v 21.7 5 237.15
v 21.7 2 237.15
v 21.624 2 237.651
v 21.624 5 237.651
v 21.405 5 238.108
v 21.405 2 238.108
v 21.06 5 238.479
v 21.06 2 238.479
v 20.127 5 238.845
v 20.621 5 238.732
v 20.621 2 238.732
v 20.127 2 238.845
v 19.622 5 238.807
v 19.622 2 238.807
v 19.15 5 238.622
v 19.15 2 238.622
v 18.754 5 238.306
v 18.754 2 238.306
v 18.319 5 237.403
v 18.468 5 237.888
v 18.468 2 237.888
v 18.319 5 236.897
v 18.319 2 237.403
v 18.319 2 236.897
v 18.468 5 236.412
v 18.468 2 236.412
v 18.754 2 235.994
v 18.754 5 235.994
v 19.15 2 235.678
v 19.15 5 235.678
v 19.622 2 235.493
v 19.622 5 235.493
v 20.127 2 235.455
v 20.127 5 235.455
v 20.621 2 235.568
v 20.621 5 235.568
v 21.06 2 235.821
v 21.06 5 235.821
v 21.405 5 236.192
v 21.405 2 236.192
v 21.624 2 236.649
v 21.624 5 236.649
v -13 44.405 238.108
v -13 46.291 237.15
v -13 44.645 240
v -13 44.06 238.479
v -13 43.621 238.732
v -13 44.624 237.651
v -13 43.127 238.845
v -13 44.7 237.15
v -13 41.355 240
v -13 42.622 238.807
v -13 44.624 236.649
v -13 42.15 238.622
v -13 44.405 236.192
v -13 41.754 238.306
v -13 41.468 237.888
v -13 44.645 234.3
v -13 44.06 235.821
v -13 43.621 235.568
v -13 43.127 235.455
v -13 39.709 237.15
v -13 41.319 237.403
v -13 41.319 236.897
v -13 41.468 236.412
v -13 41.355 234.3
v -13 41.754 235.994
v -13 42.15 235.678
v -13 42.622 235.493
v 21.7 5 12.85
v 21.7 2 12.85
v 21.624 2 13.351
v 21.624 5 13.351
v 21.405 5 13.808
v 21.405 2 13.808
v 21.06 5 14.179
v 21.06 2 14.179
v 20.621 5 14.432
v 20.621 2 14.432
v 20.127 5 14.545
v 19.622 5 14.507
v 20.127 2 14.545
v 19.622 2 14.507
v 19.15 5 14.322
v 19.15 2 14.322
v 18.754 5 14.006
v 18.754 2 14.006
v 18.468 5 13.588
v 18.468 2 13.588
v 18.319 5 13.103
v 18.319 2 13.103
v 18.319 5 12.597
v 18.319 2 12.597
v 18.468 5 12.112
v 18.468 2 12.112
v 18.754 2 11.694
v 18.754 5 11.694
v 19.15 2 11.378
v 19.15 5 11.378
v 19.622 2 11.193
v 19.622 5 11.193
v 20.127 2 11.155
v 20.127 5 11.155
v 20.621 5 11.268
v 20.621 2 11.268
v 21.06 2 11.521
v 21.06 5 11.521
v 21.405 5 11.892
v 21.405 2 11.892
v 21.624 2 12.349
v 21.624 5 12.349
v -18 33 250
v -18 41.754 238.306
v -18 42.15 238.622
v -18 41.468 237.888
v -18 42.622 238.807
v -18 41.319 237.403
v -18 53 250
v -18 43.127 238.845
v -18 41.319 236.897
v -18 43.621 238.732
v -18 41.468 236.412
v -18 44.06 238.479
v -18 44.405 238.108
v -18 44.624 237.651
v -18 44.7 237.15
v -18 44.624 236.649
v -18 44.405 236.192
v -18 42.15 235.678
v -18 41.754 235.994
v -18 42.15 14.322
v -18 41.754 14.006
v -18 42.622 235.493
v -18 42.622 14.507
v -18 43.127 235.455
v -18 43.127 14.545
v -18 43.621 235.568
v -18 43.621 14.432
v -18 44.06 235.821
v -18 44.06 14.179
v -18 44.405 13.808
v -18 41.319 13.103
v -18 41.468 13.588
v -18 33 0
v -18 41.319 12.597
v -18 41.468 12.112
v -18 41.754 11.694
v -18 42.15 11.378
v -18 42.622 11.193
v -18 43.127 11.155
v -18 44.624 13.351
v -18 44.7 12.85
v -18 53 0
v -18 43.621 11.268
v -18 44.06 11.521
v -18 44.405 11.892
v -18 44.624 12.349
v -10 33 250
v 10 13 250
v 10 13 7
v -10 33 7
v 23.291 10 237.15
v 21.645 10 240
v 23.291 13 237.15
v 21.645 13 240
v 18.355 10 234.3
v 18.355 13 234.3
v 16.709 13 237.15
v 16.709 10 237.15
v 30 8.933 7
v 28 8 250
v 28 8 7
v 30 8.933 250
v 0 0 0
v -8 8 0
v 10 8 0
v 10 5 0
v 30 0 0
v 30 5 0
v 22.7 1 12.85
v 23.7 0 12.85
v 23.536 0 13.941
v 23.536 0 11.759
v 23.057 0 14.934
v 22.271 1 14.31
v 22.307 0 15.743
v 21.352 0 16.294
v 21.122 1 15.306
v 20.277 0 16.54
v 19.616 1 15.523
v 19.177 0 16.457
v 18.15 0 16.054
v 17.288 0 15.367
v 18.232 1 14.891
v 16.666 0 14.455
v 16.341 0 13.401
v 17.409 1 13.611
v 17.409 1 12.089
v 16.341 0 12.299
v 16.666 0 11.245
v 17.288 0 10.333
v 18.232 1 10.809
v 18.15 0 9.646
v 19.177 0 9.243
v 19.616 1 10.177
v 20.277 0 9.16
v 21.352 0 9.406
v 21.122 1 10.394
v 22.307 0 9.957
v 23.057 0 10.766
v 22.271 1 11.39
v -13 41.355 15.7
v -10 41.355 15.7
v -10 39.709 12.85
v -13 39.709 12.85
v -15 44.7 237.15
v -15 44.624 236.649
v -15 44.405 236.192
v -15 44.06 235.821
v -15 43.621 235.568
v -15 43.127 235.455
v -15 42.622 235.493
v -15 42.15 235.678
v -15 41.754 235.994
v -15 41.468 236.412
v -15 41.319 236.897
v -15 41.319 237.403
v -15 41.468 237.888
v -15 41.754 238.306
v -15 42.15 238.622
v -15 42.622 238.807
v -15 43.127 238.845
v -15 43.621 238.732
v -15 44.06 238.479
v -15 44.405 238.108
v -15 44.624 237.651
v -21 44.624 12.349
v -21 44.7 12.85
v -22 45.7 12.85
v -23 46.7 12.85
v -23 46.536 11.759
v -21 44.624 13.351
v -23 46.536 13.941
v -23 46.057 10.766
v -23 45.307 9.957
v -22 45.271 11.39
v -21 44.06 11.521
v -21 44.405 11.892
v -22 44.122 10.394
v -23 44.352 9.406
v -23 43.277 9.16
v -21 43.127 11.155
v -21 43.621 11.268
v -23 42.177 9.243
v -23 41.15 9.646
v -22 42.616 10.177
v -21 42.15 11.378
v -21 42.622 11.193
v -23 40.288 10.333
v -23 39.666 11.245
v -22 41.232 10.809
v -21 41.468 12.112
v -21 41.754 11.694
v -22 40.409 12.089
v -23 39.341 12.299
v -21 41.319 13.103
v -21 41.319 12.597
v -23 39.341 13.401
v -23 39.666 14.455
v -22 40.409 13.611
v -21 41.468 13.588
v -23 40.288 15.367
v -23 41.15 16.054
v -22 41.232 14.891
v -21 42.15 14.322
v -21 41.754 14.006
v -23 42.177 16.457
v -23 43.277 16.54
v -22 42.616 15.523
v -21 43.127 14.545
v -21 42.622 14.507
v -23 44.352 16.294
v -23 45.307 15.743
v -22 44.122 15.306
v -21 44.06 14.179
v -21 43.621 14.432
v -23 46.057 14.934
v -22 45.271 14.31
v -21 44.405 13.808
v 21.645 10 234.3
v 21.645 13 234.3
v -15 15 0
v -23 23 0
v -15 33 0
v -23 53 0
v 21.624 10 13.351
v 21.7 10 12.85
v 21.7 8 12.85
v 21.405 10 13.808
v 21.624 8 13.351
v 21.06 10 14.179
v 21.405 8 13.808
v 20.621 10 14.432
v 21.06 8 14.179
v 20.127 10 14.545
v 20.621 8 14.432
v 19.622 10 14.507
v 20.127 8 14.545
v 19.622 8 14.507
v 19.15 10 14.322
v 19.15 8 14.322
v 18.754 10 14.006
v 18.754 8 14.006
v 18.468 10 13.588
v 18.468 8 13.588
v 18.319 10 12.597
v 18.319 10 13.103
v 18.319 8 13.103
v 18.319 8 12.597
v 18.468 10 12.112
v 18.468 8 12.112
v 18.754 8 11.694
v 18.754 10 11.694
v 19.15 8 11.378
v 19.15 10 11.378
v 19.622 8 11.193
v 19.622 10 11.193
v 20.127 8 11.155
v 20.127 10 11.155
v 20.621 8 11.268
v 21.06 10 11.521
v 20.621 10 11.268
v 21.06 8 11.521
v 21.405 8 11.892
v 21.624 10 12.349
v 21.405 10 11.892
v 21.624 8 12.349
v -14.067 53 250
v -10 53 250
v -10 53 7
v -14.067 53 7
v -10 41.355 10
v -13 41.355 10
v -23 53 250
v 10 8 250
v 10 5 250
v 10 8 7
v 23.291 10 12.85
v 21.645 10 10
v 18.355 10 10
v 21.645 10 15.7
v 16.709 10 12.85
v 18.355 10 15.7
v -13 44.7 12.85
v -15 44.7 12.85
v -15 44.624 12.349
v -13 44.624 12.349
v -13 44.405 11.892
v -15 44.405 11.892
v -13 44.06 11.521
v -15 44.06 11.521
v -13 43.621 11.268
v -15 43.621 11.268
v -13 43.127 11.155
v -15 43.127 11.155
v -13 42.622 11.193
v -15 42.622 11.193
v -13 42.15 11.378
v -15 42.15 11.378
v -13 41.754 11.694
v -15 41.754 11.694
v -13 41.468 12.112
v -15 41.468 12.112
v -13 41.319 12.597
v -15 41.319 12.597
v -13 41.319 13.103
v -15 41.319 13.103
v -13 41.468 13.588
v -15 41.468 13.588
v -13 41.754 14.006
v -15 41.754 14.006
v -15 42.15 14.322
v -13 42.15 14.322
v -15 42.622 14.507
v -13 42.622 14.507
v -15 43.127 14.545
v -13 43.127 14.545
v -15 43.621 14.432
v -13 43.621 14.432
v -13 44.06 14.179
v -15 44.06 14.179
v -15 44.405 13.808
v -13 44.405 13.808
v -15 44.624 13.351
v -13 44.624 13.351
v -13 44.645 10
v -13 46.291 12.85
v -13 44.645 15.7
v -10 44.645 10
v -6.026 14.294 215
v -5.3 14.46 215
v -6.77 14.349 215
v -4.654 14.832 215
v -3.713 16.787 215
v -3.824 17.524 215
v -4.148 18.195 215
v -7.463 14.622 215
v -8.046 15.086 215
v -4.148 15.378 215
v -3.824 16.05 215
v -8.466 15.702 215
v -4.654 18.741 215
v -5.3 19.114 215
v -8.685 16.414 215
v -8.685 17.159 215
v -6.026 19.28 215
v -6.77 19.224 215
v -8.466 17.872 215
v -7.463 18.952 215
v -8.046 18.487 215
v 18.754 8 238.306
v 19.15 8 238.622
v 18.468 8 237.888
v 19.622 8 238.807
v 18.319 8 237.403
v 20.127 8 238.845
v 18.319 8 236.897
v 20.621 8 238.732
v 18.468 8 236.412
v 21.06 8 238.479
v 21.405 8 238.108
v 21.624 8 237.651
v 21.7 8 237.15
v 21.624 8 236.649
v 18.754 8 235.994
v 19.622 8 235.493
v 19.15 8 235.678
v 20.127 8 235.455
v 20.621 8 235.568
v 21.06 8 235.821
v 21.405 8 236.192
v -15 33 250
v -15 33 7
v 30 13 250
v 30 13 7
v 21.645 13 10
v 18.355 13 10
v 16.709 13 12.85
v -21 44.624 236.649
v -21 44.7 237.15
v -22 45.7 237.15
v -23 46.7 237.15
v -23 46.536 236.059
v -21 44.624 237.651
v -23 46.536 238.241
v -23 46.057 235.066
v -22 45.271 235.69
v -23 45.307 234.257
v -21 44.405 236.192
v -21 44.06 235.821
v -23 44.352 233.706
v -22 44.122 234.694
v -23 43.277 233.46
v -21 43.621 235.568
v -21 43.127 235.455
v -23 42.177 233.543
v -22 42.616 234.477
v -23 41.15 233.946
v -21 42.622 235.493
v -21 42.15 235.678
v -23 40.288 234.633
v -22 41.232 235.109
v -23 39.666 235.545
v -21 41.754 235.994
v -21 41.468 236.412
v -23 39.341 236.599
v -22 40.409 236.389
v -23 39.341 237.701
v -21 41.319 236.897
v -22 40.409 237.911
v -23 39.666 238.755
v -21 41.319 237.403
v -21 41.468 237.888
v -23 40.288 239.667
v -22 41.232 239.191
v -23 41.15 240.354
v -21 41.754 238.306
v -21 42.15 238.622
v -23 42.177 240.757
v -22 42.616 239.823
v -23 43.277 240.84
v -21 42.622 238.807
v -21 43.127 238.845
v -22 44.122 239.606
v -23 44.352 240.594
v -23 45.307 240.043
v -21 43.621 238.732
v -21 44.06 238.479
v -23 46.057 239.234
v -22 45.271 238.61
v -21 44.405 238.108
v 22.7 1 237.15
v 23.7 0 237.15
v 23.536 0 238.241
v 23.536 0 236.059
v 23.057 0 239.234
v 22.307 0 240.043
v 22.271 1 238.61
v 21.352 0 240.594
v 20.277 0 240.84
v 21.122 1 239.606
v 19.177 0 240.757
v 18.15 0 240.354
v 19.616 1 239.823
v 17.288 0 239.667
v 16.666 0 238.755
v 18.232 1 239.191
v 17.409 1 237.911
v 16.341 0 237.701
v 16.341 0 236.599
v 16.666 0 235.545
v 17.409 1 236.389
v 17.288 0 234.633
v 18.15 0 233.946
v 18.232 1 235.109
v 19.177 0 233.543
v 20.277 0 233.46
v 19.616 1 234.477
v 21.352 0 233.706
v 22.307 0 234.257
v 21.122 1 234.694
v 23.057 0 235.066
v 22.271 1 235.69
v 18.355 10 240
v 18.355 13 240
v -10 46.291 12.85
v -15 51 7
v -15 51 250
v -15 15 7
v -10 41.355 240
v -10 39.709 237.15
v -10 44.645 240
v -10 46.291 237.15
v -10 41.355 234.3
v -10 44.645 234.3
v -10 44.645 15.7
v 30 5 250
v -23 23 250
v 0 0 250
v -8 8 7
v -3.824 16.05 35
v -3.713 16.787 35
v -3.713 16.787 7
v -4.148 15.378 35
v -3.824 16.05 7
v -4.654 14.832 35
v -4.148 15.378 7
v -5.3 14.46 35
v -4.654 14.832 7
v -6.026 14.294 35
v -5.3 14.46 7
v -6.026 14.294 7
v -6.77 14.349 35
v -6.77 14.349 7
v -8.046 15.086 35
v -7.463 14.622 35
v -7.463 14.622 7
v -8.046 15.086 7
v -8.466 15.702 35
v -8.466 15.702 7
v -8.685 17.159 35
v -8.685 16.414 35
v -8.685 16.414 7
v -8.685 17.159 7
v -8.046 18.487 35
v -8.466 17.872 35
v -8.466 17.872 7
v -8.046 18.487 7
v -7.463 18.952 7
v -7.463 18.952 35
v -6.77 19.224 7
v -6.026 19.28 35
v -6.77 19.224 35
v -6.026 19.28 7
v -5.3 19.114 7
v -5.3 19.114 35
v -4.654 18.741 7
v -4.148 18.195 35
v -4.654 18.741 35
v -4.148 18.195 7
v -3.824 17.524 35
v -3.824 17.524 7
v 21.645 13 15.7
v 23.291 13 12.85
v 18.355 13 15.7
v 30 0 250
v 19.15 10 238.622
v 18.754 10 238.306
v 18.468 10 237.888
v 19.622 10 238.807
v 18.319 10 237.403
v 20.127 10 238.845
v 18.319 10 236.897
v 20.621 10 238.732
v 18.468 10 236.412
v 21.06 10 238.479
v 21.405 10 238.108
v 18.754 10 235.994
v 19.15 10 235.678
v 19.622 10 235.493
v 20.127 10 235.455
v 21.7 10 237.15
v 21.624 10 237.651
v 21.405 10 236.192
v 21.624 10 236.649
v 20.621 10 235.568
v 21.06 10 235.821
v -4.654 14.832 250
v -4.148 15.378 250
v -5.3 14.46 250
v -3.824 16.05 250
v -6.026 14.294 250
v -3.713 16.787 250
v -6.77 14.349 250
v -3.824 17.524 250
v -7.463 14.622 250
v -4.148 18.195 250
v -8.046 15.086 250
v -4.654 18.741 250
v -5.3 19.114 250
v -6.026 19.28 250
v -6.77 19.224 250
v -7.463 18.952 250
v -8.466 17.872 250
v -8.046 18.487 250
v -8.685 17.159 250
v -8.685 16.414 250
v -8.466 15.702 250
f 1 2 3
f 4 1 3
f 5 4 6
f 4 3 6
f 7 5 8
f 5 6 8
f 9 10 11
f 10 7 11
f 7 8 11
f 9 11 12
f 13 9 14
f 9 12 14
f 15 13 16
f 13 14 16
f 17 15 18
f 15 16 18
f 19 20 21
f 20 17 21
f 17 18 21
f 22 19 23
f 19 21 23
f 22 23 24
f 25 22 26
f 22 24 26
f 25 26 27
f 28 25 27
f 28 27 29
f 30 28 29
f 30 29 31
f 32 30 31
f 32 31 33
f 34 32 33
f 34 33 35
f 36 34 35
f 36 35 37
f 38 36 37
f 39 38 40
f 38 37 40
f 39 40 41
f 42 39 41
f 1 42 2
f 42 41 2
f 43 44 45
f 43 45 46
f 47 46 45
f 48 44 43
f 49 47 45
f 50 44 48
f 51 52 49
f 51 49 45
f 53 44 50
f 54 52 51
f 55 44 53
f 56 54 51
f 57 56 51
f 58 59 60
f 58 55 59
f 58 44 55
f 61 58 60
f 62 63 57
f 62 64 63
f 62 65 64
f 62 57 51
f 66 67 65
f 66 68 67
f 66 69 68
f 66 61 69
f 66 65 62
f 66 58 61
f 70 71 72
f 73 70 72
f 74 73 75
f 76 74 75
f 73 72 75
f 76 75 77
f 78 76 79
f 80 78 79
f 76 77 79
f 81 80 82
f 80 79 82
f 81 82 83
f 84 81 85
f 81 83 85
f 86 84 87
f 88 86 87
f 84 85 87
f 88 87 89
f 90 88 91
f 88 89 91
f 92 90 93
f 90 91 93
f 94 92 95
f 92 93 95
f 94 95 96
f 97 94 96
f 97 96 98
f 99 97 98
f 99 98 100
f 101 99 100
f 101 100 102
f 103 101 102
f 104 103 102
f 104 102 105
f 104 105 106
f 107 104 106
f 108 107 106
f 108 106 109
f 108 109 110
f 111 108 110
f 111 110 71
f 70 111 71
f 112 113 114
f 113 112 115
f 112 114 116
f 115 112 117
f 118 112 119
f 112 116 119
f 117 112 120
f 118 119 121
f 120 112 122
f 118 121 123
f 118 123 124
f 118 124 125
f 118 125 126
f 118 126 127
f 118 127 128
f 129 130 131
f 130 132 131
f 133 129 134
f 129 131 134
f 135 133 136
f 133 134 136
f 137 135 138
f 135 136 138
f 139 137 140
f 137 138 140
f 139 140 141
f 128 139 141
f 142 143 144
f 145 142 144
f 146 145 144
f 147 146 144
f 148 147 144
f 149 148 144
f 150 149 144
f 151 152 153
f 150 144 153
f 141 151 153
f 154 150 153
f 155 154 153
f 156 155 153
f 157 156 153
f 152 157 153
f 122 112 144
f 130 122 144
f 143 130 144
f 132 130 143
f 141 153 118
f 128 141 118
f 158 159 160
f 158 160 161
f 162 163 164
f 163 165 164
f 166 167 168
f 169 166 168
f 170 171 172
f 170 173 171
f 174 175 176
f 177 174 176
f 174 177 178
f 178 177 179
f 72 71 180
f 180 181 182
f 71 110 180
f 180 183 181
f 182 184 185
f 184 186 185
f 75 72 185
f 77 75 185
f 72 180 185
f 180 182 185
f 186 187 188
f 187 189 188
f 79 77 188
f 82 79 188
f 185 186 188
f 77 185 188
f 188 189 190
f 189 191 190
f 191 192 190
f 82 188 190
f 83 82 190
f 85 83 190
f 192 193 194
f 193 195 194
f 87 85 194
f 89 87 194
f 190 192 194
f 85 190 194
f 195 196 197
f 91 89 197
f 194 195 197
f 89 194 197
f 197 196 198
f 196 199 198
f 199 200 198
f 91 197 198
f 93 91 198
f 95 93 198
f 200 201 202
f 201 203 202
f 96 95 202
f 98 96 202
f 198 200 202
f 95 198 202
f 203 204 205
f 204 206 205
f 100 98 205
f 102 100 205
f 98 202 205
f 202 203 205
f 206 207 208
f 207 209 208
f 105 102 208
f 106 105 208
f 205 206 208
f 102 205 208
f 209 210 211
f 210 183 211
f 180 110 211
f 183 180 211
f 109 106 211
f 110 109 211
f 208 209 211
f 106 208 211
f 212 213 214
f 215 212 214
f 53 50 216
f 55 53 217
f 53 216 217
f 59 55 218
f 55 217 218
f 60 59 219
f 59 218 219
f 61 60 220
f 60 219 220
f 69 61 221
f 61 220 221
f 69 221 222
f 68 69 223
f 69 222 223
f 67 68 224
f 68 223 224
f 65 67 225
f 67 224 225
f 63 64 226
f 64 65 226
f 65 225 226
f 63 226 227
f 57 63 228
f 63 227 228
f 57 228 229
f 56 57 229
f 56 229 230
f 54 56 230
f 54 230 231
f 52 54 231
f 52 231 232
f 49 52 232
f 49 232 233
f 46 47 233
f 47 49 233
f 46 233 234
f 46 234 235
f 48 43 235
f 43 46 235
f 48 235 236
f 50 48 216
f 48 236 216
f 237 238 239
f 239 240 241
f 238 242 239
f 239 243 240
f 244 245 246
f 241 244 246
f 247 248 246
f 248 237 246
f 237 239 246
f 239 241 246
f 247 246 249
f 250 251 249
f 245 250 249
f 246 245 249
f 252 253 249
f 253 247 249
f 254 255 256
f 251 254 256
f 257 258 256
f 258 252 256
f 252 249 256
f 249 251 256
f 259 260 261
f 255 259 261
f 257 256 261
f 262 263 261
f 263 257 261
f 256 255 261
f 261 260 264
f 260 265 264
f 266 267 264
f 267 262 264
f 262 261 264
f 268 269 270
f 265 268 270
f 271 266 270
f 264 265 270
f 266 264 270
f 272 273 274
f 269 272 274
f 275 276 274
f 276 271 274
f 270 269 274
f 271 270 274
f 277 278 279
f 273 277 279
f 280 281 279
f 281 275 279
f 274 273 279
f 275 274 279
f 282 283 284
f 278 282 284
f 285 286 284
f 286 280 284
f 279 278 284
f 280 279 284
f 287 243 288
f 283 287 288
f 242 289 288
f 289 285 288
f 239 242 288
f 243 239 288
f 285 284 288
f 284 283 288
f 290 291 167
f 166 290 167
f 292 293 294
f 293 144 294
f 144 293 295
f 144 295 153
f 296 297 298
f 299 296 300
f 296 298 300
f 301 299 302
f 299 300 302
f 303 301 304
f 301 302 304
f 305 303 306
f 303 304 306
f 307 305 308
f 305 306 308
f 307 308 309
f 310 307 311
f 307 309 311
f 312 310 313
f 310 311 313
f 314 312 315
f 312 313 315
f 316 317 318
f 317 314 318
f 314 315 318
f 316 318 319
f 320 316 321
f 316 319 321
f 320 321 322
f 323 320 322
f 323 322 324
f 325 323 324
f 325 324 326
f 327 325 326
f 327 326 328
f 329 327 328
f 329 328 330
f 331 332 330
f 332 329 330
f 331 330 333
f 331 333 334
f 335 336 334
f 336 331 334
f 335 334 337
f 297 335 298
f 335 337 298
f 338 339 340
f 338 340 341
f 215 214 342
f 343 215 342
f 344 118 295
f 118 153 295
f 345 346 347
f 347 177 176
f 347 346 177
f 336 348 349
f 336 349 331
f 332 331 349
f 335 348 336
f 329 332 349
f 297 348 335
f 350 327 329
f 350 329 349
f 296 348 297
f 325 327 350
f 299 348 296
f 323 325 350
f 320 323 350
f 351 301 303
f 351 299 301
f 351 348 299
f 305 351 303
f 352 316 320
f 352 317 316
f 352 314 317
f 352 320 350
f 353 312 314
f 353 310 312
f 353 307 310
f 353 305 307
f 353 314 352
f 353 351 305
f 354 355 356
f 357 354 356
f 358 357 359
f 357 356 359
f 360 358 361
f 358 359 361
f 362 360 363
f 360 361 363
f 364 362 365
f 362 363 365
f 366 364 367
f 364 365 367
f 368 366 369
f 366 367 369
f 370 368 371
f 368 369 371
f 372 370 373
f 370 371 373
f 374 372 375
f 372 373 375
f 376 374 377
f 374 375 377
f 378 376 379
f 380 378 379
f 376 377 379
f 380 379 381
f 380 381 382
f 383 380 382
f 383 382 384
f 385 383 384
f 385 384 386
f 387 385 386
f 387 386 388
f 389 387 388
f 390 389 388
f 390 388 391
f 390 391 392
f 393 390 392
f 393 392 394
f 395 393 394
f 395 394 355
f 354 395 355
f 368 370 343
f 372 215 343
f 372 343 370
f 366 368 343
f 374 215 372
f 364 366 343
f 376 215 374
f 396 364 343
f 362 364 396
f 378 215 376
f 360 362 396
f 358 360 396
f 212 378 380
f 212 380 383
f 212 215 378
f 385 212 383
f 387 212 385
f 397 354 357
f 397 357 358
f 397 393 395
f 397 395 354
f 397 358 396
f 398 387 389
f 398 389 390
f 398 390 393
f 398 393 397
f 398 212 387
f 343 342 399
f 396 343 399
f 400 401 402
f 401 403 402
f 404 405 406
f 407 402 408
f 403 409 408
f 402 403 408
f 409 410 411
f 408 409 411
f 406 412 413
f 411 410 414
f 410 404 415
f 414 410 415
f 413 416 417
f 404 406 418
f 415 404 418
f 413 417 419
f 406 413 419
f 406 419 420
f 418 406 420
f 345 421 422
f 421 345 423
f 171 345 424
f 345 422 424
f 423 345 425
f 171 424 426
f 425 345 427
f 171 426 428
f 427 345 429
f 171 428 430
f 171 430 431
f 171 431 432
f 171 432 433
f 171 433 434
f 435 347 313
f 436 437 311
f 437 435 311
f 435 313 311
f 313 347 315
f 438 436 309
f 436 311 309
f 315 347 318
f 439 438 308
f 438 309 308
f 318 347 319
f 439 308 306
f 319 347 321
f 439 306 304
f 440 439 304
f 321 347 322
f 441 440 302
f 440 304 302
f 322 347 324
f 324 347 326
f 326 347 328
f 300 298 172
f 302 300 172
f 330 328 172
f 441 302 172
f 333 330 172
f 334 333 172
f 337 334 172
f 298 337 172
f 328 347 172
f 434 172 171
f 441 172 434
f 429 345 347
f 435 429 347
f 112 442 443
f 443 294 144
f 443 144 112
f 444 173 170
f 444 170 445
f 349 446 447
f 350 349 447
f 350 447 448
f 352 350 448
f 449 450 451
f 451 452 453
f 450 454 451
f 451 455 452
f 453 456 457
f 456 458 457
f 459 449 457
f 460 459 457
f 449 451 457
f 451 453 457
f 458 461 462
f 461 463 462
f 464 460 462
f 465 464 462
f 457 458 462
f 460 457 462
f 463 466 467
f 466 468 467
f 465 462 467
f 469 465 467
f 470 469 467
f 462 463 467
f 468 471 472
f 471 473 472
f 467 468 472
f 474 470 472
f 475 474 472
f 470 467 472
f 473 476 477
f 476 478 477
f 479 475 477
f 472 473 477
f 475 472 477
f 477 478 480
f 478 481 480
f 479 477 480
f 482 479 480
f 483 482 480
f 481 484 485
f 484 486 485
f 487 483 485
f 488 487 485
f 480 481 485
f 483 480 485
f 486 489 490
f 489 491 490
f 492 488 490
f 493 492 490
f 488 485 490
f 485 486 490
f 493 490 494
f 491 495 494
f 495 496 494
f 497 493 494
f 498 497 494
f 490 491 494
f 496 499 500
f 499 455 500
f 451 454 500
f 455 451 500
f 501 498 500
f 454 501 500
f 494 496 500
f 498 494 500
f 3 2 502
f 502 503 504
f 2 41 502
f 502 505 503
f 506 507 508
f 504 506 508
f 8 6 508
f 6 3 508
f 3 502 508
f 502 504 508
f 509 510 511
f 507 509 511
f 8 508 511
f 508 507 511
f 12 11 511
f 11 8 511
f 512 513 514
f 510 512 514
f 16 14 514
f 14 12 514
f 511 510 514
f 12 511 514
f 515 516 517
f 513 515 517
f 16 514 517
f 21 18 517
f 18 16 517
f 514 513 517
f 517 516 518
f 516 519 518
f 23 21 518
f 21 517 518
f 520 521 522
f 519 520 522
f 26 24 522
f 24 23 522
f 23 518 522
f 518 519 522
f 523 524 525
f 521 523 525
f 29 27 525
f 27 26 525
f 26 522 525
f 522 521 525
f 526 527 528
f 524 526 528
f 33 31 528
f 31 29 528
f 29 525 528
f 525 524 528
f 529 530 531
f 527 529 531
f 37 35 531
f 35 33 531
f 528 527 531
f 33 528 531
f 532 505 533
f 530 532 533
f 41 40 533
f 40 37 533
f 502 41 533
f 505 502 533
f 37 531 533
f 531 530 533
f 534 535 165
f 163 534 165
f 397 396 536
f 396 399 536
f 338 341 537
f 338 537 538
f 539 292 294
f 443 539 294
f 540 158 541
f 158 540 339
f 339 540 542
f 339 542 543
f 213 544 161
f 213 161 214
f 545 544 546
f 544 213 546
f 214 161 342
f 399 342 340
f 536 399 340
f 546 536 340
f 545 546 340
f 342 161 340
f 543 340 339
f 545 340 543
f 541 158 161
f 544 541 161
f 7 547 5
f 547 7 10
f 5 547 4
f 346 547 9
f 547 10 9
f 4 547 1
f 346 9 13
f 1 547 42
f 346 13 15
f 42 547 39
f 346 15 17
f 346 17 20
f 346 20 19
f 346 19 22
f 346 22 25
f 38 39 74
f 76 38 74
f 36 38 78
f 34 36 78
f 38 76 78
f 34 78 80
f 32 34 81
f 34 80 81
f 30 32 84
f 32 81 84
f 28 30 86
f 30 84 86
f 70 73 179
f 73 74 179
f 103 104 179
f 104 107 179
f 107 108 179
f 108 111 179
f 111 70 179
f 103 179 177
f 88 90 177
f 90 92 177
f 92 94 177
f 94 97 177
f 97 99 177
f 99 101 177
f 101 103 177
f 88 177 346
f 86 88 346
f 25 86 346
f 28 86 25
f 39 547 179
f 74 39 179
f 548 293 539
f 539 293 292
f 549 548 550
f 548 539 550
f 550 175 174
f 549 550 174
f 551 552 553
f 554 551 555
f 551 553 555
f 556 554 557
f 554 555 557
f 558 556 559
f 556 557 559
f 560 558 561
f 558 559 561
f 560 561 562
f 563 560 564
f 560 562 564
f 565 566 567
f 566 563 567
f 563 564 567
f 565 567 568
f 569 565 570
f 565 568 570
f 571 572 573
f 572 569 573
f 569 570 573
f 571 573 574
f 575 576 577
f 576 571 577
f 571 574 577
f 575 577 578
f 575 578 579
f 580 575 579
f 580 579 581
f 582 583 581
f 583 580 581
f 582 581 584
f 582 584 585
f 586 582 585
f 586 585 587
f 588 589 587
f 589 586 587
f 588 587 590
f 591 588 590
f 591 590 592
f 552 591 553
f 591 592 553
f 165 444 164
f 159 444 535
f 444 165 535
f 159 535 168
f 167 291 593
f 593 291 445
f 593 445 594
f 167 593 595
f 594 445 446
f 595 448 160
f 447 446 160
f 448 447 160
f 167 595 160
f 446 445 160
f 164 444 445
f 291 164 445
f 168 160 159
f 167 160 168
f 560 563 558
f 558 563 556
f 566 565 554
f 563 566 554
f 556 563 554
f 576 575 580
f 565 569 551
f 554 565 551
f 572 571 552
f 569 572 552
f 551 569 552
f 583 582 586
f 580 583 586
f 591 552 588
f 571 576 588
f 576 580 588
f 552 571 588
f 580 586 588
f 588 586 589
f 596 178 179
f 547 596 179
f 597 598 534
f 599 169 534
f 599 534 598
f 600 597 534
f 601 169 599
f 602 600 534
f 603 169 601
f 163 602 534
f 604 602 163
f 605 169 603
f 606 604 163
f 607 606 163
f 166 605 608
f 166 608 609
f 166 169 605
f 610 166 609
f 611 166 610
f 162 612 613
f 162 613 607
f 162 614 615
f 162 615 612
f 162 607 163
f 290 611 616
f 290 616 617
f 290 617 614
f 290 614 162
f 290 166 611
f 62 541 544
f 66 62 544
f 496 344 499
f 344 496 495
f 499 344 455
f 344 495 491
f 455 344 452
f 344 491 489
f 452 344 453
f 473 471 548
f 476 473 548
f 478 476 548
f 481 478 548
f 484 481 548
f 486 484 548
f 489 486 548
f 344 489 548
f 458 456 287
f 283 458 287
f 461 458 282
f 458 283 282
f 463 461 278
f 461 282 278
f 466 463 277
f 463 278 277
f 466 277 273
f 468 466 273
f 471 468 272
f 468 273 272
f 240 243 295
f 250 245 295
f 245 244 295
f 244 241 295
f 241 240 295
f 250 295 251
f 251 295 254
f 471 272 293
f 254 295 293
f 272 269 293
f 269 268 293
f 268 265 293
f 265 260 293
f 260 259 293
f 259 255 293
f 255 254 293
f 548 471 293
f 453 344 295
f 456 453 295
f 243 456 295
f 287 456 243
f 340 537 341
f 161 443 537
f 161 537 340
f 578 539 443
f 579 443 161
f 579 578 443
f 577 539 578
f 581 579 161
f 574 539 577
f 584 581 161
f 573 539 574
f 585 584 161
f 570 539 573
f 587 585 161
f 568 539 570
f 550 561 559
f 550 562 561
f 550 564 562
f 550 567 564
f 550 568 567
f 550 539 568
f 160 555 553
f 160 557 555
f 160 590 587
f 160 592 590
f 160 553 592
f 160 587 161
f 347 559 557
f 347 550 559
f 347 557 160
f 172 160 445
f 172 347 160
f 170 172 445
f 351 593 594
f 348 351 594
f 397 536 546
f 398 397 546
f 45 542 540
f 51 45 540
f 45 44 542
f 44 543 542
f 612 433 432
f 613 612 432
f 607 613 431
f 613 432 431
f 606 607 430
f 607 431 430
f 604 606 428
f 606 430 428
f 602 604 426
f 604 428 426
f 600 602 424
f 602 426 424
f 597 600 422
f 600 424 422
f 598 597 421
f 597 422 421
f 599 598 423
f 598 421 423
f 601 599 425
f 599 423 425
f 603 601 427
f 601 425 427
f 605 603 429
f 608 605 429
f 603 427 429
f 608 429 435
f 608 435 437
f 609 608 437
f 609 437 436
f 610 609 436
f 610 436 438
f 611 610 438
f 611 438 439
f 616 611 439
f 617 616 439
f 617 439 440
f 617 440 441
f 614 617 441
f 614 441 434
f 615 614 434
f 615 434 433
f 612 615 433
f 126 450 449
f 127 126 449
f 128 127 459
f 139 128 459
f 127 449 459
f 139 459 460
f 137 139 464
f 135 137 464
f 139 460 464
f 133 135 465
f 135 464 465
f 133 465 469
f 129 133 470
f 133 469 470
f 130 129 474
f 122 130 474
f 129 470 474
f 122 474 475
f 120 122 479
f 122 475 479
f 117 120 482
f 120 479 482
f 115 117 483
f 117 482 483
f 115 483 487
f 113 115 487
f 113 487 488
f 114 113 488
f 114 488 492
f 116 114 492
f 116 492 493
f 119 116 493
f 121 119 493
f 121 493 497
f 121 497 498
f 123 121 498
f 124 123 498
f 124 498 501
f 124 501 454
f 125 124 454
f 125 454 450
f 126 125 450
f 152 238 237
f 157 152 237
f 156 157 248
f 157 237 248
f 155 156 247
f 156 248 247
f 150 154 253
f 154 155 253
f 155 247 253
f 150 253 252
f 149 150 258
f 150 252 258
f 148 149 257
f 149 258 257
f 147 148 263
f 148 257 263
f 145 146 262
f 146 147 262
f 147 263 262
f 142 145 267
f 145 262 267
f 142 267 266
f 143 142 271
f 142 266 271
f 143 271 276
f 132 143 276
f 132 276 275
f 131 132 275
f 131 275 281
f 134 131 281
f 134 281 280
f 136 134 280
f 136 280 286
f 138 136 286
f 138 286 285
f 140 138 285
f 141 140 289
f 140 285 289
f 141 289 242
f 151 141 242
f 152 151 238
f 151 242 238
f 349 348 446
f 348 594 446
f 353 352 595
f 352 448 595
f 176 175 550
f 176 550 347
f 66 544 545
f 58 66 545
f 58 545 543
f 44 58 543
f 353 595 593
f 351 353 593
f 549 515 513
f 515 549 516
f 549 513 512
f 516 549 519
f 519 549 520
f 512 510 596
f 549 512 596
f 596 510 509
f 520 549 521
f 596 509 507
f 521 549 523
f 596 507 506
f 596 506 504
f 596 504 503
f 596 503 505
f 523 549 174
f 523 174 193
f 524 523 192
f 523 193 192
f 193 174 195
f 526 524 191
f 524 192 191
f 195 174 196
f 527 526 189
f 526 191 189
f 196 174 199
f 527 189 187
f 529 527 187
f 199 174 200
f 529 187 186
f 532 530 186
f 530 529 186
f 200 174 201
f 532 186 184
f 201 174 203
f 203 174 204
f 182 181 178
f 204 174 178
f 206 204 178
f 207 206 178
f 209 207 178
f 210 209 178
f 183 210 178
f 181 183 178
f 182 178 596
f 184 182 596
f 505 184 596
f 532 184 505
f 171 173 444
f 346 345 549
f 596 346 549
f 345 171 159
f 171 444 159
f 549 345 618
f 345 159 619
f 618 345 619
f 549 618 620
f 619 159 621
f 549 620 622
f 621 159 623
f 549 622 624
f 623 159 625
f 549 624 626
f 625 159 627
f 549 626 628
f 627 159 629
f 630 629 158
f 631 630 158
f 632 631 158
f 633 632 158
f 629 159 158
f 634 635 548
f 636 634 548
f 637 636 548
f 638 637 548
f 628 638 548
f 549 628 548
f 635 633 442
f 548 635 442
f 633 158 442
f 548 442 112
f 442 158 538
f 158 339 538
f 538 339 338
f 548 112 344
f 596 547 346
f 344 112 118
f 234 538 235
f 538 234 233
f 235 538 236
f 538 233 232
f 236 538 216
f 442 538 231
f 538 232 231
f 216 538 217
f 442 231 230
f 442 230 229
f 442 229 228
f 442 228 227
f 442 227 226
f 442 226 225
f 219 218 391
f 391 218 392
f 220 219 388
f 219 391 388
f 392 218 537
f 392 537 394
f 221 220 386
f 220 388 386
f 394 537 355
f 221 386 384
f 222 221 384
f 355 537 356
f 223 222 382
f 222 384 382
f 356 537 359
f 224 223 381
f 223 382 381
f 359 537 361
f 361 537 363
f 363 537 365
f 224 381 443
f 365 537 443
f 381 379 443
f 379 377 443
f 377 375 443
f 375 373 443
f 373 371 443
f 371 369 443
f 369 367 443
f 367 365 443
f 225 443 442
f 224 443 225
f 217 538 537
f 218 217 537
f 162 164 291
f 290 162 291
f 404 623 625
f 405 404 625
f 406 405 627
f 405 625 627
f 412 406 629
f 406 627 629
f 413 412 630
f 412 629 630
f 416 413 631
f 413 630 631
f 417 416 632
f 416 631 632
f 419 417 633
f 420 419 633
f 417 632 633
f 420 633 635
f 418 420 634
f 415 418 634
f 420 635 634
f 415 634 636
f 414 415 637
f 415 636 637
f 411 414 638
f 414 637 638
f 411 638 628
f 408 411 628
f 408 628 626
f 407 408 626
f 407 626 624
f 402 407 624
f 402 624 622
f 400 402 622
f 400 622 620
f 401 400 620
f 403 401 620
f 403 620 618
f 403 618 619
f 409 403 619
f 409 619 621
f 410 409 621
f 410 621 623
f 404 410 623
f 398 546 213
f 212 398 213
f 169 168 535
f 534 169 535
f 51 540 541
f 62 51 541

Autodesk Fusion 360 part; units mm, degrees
sketch "Esquisse1" plane through (0, 0, 0) normal (0, 0, 1) x (1, 0, 0)
  line L0 (0, 0) -> (30, 0)
  line L1 (30, 0) -> (30, 5)
  line L2 (30, 5) -> (10, 5)
  line L3 (10, 5) -> (10, 8)
  line L4 (10, 8) -> (30, 8)
  line L5 (30, 8) -> (30, 13)
  line L6 (30, 13) -> (10, 13)
  line L7 (10, 13) -> (0, 23)
  line L8 (0, 23) -> (-11.5, 11.5)
  line L9 (-11.5, 11.5) -> (0, 0)
  dimension "d2" = 3
  dimension "d3" = 5
  dimension "d4" = 20
  dimension "d5" = 30
  dimension "d6" = 20
  dimension "d7" = 15
  dimension "d8" = 135
  dimension "d22" = 13
extrude "Extrusion1" add sketch "Esquisse1" along normal blind 125 makes body 1
chamfer "Chanfrein2" distance 2 angle 25 1 edges at (30, 8, 62.5) measured on face at (16.6667, 8, 41.6667) on bodies 1
sketch "Esquisse2" plane through (0, 0, 0) normal (0, -1, 0) x (1, 0, 0)
  line L0 (0, 0) -> (30, 0)
  line L1 (30, 0) -> (30, 125)
  line L2 (30, 125) -> (0, 125)
  line L3 (0, 125) -> (0, 0)
  circle A0 centre (20, 12.85) radius 1.7
  line L4 (18.3546, 15.7) -> (16.7091, 12.85)
  line L5 (16.7091, 12.85) -> (18.3546, 10)
  line L6 (18.3546, 10) -> (21.6454, 10)
  line L7 (21.6454, 10) -> (23.2909, 12.85)
  line L8 (23.2909, 12.85) -> (21.6454, 15.7)
  line L9 (21.6454, 15.7) -> (18.3546, 15.7)
  line L10 (0, 0) -> (30, 0)
  point P0 (20, 12.85)
  point P1 (-10, 0)
  point P2 (-30, 125)
  dimension "d11" = 3.4
  dimension "d12" = 2.85
  dimension "d15" = 10
  dimension "d16" = 10
extrude "Extrusion2" cut sketch "Esquisse2" against normal blind 13 contours A0 bodies 1
chamfer "Chanfrein1" distance 2 angle 45 1 edges at (18.415, 0, 13.4647) on bodies 1
sketch "Esquisse3" plane through (0, 13, 0) normal (0, 1, 0) x (-1, 0, 0)
  circle A0 centre (-20, 12.85) radius 1.7
  line L0 (-30, 0) -> (-10, 0)
  line L1 (-10, 0) -> (-10, 125)
  line L2 (-10, 125) -> (-30, 125)
  line L3 (-30, 125) -> (-30, 0)
  line L4 (-18.3546, 15.7) -> (-21.6454, 15.7)
  line L5 (-21.6454, 15.7) -> (-23.2909, 12.85)
  line L6 (-23.2909, 12.85) -> (-21.6454, 10)
  line L7 (-21.6454, 10) -> (-18.3546, 10)
  line L8 (-18.3546, 10) -> (-16.7091, 12.85)
  line L9 (-16.7091, 12.85) -> (-18.3546, 15.7)
  point P0 (-20, 12.85)
  dimension "d23" = 2.85
extrude "Extrusion4" cut sketch "Esquisse3" against normal blind 3 contours L4 L5 L6 L7 L8 L9 bodies 1
ref_plane "Plan de construction2" through (-5.75, 17.25, 62.5) normal (-0.7071, 0.7071, 0) x (-0.7071, -0.7071, 0)
mirror "Symétrie miroir1" about plane through (-5.75, 17.25, 62.5) normal (-0.7071, 0.7071, 0) of bodies 1 merged
sketch "Esquisse4" plane through (0, 0, 0) normal (0, 0, 1) x (1, 0, 0)
  line L0 (10, 13) -> (-10, 33) construction
  line L1 (-6.2132, 8) -> (-6.2132, 16.7868) construction
  line L2 (-6.2132, 16.7868) -> (-15, 16.7868) construction
  line L3 (-6.2132, 16.7868) -> (0, 23) construction
  line L4 (29.8, 8) -> (8.2, 8) construction
  line L5 (-15, 52.8) -> (-15, 31.2) construction
  circle A0 centre (-6.2132, 16.7868) radius 2.5
  point P0 (-15, 8)
  dimension "d32" = 5
  dimension "d33" = 8.7868
extrude "Extrusion5" cut sketch "Esquisse4" along normal blind 35 bodies 1
ref_plane "Plan de construction3" through (3.5, 26.5, 125) normal (0, 0, 1) x (1, 0, 0)
mirror "Symétrie miroir2" about plane through (3.5, 26.5, 125) normal (0, 0, 1) of bodies 1 merged
sketch "Esquisse5" plane through (0, 0, 0) normal (0, 0, -1) x (1, 0, 0)
  line L0 (30, -8.9326) -> (28, -8)
  line L1 (28, -8) -> (10, -8)
  line L2 (10, -8) -> (10, -5)
  line L3 (10, -5) -> (30, -5)
  line L4 (30, -5) -> (30, 0)
  line L5 (30, 0) -> (0, 0)
  line L6 (0, 0) -> (-23, -23)
  line L7 (-23, -23) -> (-23, -53)
  line L8 (-23, -53) -> (-18, -53)
  line L9 (-18, -53) -> (-18, -33)
  line L10 (-18, -33) -> (-15, -33)
  line L11 (-15, -33) -> (-15, -51)
  line L12 (-15, -51) -> (-14.0674, -53)
  line L13 (-14.0674, -53) -> (-10, -53)
  line L14 (-10, -53) -> (-10, -33)
  line L15 (-10, -33) -> (10, -13)
  line L16 (10, -13) -> (30, -13)
  line L17 (30, -13) -> (30, -8.9326)
  line L18 (-15, -8) -> (185, -8)
  line L19 (185, -8) -> (185, -208)
  line L20 (185, -208) -> (-15, -208)
  line L21 (-15, -208) -> (-15, -8)
  circle A0 centre (-6.2132, -16.7868) radius 2.5
  dimension "d39" = 200
  dimension "d40" = 200
extrude "Extrusion6" cut sketch "Esquisse5" against normal blind 7 contours L0 L1 L6 L11 L12 L13 L14 L15 L16 L17 L18 L21 | L0 L12 L13 L14 L15 L16 L17 L18 L19 L20 L21 | A0 bodies 1
copy_body "Corps->Comp1" bodies 1 removing the originals makes body 2 in component "Component"
component "Component" placed x (1, 0, 0) y (0, 1, 0) z (0, 0, 1) at (0, 0, 0)
equation "d4 = d6 + 0 mm"
equation "d5 = d4 + 10 mm"
equation "d9 = ( 250 / 2 ) * 1 mm"
equation "d13 = -( 2 * d3 + d2 )"
equation "d15 = d6 / 2"
equation "d23 = d12"
equation "d27 = -d3 + 2 mm"
